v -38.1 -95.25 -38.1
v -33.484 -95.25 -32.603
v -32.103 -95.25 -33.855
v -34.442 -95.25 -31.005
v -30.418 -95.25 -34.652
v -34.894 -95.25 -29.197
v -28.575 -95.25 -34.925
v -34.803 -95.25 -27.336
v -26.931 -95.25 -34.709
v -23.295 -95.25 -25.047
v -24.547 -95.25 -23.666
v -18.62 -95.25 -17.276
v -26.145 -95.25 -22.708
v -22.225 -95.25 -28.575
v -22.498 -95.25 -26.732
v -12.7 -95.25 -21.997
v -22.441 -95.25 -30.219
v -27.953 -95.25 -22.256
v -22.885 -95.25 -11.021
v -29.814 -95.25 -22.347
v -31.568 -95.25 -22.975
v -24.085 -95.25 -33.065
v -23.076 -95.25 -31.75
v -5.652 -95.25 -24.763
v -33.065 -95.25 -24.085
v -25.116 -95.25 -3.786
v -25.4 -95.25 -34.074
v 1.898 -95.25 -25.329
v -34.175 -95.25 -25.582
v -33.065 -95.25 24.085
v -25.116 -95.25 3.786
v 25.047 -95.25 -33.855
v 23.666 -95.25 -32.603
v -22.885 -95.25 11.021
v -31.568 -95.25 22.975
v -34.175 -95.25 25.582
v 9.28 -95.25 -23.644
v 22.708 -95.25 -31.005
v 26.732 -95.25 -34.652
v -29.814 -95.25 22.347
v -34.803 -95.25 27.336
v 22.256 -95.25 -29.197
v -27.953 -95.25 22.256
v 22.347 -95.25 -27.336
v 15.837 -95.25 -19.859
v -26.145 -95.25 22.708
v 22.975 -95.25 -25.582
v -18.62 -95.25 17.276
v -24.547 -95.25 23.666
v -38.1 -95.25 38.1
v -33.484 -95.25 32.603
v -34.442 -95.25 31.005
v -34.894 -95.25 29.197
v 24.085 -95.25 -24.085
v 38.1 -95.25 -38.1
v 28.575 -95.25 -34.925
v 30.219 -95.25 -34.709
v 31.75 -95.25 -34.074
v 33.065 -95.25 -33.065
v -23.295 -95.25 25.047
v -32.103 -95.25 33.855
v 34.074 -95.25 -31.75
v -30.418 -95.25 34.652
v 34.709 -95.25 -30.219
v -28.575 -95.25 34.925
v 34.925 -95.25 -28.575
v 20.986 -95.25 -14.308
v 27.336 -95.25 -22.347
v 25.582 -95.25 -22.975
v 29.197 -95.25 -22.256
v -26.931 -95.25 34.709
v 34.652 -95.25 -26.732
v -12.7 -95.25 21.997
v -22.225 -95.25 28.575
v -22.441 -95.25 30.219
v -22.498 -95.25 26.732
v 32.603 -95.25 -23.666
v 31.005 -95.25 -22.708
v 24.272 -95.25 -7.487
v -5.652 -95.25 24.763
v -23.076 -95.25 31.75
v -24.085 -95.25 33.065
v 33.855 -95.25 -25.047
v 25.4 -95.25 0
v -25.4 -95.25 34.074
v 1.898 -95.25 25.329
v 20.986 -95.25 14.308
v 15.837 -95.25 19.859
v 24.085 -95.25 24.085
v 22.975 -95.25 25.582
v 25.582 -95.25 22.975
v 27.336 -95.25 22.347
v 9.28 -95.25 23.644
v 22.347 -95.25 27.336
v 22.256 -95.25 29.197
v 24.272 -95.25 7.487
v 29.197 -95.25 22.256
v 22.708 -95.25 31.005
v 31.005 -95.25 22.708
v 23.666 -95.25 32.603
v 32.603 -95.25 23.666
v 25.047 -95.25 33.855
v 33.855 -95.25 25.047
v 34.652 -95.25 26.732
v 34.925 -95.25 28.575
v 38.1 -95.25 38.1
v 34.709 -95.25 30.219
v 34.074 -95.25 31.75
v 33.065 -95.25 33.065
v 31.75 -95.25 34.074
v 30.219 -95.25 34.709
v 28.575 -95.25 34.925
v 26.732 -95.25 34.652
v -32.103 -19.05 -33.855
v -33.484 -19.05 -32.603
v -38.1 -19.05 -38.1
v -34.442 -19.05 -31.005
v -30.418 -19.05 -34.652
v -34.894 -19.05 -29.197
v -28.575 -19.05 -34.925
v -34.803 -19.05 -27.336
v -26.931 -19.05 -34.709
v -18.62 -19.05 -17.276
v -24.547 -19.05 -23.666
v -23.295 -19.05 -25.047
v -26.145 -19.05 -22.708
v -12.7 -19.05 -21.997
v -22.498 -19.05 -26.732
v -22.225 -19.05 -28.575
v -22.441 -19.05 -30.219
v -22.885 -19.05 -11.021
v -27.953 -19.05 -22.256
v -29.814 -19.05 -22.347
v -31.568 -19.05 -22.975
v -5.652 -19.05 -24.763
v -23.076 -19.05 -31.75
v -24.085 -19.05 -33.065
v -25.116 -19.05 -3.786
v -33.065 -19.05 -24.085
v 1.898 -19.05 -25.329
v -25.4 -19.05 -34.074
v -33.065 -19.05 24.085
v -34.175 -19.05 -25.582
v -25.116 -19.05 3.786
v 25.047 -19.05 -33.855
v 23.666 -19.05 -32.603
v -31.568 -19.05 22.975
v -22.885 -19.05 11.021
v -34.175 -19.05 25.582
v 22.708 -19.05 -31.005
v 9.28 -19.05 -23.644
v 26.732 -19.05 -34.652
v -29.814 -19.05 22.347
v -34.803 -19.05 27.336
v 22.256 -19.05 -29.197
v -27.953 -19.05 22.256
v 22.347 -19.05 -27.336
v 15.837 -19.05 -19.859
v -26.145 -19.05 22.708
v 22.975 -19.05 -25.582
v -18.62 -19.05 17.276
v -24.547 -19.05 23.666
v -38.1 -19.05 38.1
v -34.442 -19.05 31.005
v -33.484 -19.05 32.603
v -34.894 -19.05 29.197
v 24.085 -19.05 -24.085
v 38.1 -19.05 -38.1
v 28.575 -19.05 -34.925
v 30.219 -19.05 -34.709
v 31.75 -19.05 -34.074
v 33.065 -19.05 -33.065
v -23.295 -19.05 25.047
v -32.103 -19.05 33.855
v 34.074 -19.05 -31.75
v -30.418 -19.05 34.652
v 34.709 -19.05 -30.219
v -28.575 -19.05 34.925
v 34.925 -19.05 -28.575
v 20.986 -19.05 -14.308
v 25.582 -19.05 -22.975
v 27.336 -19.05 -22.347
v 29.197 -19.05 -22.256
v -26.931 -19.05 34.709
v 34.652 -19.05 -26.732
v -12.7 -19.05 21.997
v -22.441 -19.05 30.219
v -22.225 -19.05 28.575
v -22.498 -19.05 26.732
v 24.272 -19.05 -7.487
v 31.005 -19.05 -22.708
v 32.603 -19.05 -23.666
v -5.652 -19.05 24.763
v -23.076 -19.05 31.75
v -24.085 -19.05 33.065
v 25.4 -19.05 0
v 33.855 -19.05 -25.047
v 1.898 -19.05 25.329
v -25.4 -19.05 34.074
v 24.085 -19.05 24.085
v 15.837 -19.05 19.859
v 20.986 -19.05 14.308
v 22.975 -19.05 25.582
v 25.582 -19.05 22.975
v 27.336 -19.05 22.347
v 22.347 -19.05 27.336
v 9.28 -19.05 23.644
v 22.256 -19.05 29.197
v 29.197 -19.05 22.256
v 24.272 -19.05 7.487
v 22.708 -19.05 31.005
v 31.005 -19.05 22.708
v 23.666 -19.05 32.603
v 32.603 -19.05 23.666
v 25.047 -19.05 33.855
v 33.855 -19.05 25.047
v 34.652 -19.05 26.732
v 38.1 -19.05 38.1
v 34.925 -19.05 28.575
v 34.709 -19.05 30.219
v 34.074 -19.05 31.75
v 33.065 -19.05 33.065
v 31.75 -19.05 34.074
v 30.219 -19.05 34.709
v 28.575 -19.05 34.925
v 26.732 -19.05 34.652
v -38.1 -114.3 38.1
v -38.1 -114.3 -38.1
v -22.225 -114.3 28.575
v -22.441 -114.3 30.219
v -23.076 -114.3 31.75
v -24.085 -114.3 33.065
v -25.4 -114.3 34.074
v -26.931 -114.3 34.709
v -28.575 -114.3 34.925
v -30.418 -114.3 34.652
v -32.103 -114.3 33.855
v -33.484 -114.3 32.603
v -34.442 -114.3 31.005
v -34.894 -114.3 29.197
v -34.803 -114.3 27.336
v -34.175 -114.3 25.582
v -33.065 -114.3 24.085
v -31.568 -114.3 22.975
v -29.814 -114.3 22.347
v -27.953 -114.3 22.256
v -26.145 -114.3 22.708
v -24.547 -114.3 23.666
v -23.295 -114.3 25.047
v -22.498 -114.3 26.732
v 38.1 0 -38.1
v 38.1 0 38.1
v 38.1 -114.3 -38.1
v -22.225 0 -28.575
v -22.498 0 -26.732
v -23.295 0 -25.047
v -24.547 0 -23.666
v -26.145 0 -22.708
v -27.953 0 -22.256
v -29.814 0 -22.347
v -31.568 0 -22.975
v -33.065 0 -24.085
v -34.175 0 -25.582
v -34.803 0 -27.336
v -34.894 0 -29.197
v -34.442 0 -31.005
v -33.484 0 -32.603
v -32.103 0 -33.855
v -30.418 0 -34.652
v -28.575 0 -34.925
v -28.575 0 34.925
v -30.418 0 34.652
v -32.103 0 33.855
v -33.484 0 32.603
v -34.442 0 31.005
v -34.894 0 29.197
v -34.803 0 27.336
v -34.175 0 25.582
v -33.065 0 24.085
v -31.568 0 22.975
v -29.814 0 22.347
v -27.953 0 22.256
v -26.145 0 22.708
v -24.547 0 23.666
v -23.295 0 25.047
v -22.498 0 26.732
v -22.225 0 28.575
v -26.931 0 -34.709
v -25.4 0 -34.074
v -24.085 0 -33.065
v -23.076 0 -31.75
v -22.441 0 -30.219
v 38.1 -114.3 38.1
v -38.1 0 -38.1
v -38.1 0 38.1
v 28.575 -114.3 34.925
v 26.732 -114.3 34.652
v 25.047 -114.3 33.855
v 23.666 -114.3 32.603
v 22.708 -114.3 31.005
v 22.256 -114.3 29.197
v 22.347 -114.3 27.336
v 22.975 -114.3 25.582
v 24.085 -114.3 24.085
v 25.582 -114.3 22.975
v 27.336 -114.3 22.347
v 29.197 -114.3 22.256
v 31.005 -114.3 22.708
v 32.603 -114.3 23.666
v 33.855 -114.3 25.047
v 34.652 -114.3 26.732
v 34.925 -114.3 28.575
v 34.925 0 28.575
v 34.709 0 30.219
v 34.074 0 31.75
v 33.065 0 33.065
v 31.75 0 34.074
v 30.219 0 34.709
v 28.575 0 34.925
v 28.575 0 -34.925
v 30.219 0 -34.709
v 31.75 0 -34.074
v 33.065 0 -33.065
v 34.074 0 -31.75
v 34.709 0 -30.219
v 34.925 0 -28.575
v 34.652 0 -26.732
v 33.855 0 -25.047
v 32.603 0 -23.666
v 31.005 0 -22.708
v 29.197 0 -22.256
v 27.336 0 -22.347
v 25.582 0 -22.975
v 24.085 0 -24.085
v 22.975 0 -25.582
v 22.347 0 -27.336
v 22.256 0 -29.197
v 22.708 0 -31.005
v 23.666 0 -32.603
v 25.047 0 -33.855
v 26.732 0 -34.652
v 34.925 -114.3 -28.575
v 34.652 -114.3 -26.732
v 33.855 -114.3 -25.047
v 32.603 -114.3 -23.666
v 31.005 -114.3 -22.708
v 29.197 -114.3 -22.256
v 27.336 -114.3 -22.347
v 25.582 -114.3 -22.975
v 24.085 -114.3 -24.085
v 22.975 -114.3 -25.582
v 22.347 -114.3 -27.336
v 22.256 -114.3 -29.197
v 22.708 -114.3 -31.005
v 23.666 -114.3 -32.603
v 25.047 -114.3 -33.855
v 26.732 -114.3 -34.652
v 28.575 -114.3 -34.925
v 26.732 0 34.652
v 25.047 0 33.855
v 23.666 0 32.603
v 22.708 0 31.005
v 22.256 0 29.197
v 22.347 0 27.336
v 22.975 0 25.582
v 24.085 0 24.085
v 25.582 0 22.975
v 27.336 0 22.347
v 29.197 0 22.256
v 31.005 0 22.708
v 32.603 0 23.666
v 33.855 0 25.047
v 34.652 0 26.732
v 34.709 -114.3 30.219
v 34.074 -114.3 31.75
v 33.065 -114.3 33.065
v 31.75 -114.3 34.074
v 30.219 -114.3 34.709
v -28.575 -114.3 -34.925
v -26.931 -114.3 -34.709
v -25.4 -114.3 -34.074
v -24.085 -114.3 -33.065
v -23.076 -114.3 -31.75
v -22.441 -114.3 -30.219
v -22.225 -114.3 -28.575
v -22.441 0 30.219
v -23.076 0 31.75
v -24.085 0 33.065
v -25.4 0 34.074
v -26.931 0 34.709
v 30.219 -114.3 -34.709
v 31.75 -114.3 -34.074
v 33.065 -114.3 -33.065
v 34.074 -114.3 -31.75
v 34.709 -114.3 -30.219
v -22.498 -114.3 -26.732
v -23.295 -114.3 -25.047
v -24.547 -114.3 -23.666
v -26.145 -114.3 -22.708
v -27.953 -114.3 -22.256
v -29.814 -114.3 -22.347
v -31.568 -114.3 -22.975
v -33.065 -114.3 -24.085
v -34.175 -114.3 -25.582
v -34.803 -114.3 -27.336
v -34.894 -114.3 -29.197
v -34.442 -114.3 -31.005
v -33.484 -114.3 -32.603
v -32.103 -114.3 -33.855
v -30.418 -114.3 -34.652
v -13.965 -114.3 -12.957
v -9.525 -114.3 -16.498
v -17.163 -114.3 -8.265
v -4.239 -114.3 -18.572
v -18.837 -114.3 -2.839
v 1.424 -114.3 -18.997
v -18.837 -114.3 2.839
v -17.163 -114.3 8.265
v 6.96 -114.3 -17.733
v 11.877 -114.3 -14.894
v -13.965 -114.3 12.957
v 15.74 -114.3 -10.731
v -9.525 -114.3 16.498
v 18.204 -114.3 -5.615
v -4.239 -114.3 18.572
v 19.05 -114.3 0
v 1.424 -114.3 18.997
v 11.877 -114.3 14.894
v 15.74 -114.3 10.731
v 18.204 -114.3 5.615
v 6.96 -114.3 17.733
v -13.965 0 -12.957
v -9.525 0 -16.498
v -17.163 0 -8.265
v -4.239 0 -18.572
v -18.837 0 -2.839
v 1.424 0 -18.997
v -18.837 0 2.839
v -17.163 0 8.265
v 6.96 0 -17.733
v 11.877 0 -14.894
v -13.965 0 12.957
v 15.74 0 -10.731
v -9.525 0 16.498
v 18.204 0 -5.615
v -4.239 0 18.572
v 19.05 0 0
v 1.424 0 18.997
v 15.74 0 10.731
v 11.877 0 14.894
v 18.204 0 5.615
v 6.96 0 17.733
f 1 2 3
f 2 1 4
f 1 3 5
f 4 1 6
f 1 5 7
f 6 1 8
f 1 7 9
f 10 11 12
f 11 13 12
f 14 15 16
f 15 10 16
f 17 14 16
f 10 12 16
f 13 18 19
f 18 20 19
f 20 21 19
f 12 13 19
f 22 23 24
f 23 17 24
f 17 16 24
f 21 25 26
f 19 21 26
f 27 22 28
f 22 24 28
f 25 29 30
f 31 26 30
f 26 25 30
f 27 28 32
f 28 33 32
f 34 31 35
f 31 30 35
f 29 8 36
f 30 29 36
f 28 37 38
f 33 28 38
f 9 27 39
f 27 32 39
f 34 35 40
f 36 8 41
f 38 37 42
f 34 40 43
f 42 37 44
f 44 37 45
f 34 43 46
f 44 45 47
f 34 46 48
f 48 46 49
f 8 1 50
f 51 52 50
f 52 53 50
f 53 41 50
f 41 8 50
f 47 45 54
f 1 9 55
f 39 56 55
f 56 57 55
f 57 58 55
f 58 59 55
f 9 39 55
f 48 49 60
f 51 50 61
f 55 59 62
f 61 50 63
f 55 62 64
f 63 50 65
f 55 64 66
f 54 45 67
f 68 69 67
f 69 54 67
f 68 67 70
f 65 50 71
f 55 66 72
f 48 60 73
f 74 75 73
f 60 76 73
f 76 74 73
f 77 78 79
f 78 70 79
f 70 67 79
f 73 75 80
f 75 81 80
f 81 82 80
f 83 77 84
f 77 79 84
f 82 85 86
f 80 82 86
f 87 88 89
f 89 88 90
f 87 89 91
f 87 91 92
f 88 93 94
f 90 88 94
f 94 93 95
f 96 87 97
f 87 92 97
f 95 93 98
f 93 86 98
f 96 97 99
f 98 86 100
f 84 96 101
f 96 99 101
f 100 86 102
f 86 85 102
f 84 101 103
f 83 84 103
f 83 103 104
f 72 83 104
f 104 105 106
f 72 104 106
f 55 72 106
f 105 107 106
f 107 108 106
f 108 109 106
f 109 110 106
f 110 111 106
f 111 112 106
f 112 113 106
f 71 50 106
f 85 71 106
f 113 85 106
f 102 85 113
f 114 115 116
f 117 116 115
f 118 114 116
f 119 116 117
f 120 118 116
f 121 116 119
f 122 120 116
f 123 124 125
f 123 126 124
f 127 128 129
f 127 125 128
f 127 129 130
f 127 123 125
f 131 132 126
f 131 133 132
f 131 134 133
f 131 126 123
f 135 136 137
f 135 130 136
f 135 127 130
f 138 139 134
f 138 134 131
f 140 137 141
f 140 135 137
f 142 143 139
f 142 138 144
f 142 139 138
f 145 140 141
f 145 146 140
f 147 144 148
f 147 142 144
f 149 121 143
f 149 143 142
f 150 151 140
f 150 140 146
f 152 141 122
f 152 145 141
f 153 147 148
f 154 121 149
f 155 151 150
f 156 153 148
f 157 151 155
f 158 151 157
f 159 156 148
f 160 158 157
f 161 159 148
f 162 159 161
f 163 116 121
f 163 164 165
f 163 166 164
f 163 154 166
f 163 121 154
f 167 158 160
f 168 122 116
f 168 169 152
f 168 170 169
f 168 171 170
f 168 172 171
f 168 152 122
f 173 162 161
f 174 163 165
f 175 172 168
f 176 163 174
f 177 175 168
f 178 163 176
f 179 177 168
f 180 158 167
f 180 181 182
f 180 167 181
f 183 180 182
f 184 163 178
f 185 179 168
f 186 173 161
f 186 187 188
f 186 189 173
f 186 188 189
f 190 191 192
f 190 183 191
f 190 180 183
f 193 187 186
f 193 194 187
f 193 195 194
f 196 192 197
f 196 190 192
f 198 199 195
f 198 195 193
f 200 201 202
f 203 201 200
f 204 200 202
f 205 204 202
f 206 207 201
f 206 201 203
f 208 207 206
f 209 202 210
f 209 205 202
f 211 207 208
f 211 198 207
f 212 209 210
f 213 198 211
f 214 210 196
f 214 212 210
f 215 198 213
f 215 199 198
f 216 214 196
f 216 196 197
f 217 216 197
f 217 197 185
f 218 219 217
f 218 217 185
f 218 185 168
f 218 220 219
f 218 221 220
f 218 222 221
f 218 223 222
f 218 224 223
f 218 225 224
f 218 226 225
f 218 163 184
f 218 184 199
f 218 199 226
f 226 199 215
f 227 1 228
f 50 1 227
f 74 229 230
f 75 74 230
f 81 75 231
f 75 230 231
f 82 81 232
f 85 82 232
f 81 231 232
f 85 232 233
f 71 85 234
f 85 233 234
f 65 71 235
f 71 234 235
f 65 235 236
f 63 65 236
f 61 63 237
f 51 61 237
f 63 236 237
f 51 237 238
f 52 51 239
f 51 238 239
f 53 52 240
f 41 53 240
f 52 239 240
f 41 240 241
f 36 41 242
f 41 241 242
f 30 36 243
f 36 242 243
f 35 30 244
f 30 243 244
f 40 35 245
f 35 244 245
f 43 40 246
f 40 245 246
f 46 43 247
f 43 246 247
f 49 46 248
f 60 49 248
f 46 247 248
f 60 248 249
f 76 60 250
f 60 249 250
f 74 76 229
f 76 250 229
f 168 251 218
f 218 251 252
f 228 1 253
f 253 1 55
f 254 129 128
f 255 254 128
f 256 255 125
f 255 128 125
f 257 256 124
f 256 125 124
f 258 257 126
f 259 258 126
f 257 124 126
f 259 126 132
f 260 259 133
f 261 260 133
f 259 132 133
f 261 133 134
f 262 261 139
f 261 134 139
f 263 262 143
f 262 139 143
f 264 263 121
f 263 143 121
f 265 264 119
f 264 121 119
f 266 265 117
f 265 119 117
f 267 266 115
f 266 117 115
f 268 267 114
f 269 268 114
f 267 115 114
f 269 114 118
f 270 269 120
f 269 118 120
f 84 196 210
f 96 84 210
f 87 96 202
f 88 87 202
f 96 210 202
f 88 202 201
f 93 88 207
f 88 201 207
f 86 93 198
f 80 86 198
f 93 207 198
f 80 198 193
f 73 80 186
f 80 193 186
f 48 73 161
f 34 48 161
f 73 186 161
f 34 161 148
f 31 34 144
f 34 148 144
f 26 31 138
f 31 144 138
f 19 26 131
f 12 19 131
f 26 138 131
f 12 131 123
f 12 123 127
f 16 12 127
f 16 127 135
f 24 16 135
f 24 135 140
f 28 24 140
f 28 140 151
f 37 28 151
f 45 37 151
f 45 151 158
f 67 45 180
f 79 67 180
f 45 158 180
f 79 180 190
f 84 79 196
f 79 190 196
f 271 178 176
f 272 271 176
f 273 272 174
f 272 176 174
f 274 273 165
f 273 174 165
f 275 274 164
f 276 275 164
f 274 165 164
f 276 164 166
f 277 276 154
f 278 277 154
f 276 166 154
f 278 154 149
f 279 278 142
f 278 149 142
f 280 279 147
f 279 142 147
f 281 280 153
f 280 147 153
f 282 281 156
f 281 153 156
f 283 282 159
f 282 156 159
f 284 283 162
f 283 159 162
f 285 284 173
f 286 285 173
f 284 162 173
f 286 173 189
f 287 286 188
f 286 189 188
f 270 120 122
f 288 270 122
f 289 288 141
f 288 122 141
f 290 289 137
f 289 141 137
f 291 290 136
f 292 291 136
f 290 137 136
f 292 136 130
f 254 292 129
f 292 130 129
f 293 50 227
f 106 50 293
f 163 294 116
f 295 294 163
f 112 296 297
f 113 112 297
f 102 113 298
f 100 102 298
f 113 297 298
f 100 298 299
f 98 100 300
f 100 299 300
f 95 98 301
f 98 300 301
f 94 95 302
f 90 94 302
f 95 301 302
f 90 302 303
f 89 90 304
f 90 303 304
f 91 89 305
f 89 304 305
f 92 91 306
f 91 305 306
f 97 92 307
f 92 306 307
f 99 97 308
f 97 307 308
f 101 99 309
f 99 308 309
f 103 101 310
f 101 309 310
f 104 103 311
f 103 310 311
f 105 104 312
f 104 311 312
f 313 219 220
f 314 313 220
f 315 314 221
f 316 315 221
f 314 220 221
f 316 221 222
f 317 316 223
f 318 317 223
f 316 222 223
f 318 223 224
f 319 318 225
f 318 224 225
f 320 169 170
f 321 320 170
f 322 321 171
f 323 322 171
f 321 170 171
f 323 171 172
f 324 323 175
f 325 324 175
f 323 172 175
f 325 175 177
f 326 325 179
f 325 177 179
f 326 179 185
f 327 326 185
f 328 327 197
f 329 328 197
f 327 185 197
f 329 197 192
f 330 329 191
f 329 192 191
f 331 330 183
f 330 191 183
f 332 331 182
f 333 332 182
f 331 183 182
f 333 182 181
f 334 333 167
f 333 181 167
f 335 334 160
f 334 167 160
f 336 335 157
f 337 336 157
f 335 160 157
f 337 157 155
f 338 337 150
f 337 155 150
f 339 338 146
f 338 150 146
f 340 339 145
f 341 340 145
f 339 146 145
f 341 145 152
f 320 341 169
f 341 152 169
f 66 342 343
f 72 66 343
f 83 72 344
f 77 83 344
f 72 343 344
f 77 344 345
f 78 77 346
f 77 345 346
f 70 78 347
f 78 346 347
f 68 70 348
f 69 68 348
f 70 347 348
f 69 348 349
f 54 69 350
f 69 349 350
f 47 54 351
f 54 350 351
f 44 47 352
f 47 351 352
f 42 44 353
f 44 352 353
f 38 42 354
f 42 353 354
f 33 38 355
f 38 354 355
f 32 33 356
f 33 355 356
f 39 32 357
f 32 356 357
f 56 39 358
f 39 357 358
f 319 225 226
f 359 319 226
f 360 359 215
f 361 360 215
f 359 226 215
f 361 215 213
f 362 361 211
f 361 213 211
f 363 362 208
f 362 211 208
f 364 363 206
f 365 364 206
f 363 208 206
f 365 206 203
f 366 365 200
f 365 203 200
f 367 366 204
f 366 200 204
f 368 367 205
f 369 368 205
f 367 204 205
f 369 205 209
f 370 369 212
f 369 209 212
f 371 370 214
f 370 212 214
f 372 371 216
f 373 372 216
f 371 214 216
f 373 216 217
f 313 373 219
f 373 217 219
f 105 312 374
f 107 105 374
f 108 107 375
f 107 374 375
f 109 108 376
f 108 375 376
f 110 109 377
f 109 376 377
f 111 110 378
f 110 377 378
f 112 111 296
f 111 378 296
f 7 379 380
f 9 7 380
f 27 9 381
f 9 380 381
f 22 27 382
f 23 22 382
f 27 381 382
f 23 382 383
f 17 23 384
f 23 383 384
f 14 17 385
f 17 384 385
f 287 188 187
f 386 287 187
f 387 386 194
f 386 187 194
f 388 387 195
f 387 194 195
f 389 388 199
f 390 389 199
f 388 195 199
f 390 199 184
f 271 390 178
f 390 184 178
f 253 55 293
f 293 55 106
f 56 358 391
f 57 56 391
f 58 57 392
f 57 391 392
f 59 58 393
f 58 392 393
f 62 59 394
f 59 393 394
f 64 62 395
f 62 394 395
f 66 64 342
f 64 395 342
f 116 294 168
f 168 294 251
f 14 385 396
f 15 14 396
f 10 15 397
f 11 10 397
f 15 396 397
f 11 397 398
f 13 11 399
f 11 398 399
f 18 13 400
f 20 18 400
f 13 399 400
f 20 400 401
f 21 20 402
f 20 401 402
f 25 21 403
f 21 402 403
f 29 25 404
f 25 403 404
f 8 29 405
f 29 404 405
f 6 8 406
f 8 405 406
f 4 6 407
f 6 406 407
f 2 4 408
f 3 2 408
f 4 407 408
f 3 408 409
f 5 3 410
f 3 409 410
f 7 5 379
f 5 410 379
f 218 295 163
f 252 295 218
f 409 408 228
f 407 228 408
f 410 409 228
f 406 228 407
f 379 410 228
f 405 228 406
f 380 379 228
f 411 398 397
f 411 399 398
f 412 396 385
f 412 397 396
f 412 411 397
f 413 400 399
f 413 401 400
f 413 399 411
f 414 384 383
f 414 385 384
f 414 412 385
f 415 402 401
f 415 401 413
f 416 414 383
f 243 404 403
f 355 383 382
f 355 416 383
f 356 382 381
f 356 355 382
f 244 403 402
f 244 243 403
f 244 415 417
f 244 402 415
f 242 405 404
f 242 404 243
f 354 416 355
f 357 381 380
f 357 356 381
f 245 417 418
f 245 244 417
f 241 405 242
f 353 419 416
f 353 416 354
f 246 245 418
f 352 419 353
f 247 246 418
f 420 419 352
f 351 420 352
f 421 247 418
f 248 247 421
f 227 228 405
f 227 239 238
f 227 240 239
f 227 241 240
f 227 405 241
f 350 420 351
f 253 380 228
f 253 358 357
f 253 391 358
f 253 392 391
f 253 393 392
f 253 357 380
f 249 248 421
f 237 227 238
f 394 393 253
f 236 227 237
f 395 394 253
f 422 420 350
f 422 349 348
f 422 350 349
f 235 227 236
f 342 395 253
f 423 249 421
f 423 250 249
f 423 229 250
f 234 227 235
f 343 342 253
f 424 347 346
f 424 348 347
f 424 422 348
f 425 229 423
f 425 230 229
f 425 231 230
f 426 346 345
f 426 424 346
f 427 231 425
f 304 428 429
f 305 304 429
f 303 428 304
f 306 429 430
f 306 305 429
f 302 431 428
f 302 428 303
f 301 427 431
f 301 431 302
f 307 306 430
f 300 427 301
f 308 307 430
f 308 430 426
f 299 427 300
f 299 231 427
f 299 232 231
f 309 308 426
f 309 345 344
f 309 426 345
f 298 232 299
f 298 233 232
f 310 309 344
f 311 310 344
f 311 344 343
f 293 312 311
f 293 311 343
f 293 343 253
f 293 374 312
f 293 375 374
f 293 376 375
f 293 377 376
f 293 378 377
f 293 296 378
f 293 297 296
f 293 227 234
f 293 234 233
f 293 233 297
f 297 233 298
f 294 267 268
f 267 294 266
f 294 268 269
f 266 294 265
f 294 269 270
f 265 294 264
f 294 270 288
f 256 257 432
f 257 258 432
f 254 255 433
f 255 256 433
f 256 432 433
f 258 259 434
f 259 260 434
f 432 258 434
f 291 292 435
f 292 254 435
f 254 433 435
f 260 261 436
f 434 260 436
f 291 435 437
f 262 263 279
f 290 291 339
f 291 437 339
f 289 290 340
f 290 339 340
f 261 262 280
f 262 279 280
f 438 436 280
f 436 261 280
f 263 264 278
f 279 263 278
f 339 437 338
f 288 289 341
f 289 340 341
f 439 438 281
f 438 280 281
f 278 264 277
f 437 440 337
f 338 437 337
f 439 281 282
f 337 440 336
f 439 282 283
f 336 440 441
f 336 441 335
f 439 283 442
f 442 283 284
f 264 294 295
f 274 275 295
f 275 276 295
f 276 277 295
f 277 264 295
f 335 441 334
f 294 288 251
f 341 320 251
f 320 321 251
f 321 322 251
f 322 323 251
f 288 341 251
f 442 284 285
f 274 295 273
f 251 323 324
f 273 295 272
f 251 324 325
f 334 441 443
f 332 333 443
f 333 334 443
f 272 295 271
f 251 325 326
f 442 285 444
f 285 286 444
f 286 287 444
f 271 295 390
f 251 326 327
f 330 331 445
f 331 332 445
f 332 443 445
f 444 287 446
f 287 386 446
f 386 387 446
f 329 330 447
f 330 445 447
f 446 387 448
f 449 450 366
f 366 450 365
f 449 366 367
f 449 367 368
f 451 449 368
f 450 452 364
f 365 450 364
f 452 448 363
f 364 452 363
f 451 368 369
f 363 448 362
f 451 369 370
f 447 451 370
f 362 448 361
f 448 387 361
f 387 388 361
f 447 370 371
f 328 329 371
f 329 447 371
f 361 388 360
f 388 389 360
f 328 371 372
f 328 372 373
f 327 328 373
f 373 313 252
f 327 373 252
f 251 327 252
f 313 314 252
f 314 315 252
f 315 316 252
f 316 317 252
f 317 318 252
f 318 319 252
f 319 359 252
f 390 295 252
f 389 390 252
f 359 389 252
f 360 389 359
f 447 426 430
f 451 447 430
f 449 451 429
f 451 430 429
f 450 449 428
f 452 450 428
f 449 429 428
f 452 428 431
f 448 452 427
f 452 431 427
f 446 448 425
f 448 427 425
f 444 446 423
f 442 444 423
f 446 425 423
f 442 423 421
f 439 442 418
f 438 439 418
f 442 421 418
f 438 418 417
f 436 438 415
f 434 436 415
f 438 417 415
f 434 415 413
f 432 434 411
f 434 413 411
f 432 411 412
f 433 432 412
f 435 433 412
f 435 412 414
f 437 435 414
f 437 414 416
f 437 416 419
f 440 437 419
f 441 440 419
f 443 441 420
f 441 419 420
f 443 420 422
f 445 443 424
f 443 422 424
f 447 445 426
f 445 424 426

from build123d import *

# Parameters (mm, degrees)
F0_W     = 76.2
F0_H     = 76.2
F1_DEPTH = 19.05
F2_R     = 25.4
F3_DEPTH = 76.2
F4_W     = 76.2
F4_H     = 76.2
F4_R     = 25.4
F5_DEPTH = 19.05
F6_R     = 19.05
F7_DEPTH = 114.3
F9_DEPTH = 127


with BuildPart() as f1:
    # F0 (on Front) → F1 (new body)
    with BuildSketch(Plane.XZ):
        Rectangle(F0_W, F0_H)
    extrude(amount=F1_DEPTH)

    # F2 (on face) → F3 (join)
    with BuildSketch(Plane.XZ.offset(19.05)):
        Circle(F2_R)
    extrude(amount=F3_DEPTH)

    # F4 (on face) → F5 (join)
    with BuildSketch(Plane.XZ.offset(95.25)):
        Rectangle(F4_W, F4_H)
        Circle(F4_R, mode=Mode.SUBTRACT)
        Circle(F4_R)
    extrude(amount=F5_DEPTH)

    # F6 (on face) → F7 (cut)
    with BuildSketch(Plane.XZ.offset(114.3)):
        Circle(F6_R)
    extrude(amount=-F7_DEPTH, mode=Mode.SUBTRACT)

    # F8 (on face) → F9 (cut)
    with BuildSketch(Plane.XZ.offset(114.3)):
        with BuildLine():
            ThreePointArc((-22.225, 28.575), (-24.0848719395, 33.0651280605), (-28.575, 34.925))
            ThreePointArc((-28.575, 34.925), (-33.0651280605, 24.0848719395), (-22.225, 28.575))
        make_face()
        with BuildLine():
            ThreePointArc((-22.225, -28.575), (-33.0651280605, -24.0848719395), (-28.575, -34.925))
            ThreePointArc((-28.575, -34.925), (-24.0848719395, -33.0651280605), (-22.225, -28.575))
        make_face()
        with BuildLine():
            ThreePointArc((34.925, -28.575), (24.0848719395, -24.0848719395), (28.575, -34.925))
            ThreePointArc((28.575, -34.925), (33.0651280605, -33.0651280605), (34.925, -28.575))
        make_face()
        with BuildLine():
            ThreePointArc((34.925, 28.575), (33.0651280605, 33.0651280605), (28.575, 34.925))
            ThreePointArc((28.575, 34.925), (24.0848719395, 24.0848719395), (34.925, 28.575))
        make_face()
    extrude(amount=-F9_DEPTH, mode=Mode.SUBTRACT)


solid = f1.part
